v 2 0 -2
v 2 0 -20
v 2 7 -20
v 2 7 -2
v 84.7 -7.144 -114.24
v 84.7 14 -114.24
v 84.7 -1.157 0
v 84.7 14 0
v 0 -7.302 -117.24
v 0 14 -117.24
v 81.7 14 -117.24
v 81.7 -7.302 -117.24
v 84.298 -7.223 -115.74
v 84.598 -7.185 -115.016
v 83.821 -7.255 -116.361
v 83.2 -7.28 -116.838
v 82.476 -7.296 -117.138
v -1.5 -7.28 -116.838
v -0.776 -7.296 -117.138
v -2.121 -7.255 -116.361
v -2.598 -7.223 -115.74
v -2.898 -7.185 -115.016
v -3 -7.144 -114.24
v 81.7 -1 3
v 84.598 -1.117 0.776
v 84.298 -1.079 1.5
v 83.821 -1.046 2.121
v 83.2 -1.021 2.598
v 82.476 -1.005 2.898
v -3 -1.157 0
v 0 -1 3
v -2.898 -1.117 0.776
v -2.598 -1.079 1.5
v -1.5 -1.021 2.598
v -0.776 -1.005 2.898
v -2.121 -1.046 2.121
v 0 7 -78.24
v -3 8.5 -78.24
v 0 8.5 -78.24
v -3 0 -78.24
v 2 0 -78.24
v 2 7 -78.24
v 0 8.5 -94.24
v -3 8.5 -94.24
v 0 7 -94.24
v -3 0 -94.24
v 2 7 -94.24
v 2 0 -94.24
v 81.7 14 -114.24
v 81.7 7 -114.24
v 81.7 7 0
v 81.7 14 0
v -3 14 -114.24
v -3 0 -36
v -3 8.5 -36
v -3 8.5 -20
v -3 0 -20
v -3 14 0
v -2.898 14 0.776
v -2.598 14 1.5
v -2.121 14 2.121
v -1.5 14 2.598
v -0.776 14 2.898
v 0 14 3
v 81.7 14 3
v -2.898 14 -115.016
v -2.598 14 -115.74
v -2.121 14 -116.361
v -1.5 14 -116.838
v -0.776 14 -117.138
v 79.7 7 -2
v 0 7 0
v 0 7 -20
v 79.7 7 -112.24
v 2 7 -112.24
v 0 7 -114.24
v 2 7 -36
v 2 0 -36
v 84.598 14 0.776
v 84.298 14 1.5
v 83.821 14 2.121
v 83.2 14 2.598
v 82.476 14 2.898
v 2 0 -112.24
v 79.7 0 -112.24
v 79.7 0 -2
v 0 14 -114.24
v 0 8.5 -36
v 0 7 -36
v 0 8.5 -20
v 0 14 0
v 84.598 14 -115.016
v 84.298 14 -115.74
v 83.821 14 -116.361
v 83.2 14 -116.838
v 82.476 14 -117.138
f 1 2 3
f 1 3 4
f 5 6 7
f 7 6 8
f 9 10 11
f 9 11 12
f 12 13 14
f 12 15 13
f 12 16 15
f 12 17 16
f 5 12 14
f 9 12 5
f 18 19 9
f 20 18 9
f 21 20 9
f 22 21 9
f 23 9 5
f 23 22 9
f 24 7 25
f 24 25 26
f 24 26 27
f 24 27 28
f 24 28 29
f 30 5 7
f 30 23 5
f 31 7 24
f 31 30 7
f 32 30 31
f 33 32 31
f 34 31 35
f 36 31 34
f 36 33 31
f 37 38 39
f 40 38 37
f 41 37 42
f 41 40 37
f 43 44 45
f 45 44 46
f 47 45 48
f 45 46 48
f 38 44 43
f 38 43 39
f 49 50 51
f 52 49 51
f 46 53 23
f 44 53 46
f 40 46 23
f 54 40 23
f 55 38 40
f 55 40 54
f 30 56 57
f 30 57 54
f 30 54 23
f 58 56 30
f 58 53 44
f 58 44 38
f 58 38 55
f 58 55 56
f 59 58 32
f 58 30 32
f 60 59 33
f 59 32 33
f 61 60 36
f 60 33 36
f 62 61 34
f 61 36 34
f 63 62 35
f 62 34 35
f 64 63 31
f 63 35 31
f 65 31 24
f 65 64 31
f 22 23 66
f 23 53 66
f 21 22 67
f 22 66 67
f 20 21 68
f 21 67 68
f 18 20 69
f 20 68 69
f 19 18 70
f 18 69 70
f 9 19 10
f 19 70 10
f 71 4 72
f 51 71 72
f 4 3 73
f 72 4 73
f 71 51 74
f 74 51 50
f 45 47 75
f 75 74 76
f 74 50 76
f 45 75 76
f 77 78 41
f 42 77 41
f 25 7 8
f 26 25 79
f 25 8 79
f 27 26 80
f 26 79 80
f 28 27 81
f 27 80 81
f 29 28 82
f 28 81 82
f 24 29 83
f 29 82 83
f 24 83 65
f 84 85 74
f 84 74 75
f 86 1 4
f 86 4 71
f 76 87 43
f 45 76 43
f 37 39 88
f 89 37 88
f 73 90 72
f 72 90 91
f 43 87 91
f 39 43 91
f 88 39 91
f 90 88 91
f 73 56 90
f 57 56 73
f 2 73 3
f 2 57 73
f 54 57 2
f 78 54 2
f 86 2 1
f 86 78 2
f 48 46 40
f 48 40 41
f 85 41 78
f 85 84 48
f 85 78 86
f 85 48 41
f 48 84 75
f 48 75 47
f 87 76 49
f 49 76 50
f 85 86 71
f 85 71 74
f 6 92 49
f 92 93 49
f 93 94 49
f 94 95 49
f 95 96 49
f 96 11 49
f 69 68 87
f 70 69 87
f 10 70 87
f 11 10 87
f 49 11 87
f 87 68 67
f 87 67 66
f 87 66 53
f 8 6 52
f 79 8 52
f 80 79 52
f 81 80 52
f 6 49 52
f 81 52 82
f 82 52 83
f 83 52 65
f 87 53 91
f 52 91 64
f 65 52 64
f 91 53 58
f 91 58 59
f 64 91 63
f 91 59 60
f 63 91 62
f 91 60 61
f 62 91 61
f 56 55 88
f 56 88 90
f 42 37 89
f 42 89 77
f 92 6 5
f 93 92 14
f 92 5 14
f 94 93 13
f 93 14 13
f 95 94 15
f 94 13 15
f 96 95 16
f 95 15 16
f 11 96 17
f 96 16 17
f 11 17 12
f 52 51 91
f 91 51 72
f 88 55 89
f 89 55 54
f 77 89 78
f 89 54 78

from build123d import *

# Parameters (mm, degrees)
BOSS_EXTRUDE1_DEPTH   = 14
SKETCH1_W             = 3
SKETCH1_H             = 42.24
BOSS_EXTRUDE1_2_DEPTH = 14
SKETCH1_3_W           = 3
SKETCH1_3_H           = 16
SKETCH1_3_H_2         = 42.24
SKETCH1_3_W_2         = 81.7
SKETCH1_3_H_3         = 114.24
BOSS_EXTRUDE2_DEPTH   = 1
BOSS_EXTRUDE3_DEPTH   = 87.7
FILLET1_R             = 3
SKETCH3_W             = 2
SKETCH3_H             = 42.24
BOSS_EXTRUDE4_DEPTH   = 7
SKETCH4_W             = 16
SKETCH4_H             = 5.5
BOSS_EXTRUDE5_DEPTH   = 3


with BuildPart() as part:
    # Sketch1 → Boss-Extrude1 (new body)
    with BuildSketch(Plane(origin=(0, 0, 0), x_dir=(1, 0, 0), z_dir=(0, 1, 0))):
        Polygon((81.7, 0), (0, 0), (0, 20), (-3, 20), (-3, -3), (84.7, -3), (84.7, 117.24), (-3, 117.24), (-3, 94.24), (0, 94.24), (0, 114.24), (81.7, 114.24), align=None)
    extrude(amount=BOSS_EXTRUDE1_DEPTH)

    # Sketch1<3> → Boss-Extrude2 (add)
    with BuildSketch(Plane(origin=(0, 0, 0), x_dir=(1, 0, 0), z_dir=(0, 1, 0))):
        with Locations((-1.5, 86.24)):
            Rectangle(SKETCH1_3_W, SKETCH1_3_H)
        with Locations((-1.5, 57.12)):
            Rectangle(SKETCH1_3_W, SKETCH1_3_H_2)
        with Locations((-1.5, 28)):
            Rectangle(SKETCH1_3_W, SKETCH1_3_H)
        with Locations((40.85, 57.12)):
            Rectangle(SKETCH1_3_W_2, SKETCH1_3_H_3)
        Polygon((81.7, 0), (0, 0), (0, 20), (-3, 20), (-3, -3), (84.7, -3), (84.7, 117.24), (-3, 117.24), (-3, 94.24), (0, 94.24), (0, 114.24), (81.7, 114.24), align=None)
    extrude(amount=-BOSS_EXTRUDE2_DEPTH)



with BuildPart() as body_2:
    # Sketch1 → Boss-Extrude1 2 (new body)
    with BuildSketch(Plane(origin=(0, 0, 0), x_dir=(1, 0, 0), z_dir=(0, 1, 0))):
        with Locations((-1.5, 57.12)):
            Rectangle(SKETCH1_W, SKETCH1_H)
    extrude(amount=BOSS_EXTRUDE1_2_DEPTH)


with BuildPart() as part_1:
    add(part.part)

    add(body_2.part)  # Boss-Extrude3 merges body 2
    # Sketch2 → Boss-Extrude3 (add)
    with BuildSketch(Plane.ZY.offset(3)):
        Polygon((-117.24, -1), (-117.24, -7.301511381), (3, -1), (3, 0), (-117.24, 0), align=None)
    extrude(amount=-BOSS_EXTRUDE3_DEPTH)

    # Fillet1
    fillet1_edges = [part_1.edges().sort_by_distance(p)[0] for p in [
        (-3, 3.34924431, -117.24),
        (84.7, 3.34924431, -117.24),
        (84.7, 6.5, 3),
        (-3, 6.5, 3),
    ]]
    fillet(fillet1_edges, radius=FILLET1_R)

    # Sketch3 → Boss-Extrude4 (add)
    with BuildSketch(Plane(origin=(0, 0, 0), x_dir=(1, 0, 0), z_dir=(0, 1, 0))):
        with Locations((1, 57.12)):
            Rectangle(SKETCH3_W, SKETCH3_H)
        Polygon((2, 20), (2, 2), (79.7, 2), (79.7, 112.24), (2, 112.24), (2, 94.24), (0, 94.24), (0, 114.24), (81.7, 114.24), (81.7, 0), (0, 0), (0, 20), align=None)
    extrude(amount=BOSS_EXTRUDE4_DEPTH)

    # Sketch4 → Boss-Extrude5 (add)
    with BuildSketch(Plane.ZY.offset(3)):
        with Locations((-86.24, 11.25)):
            Rectangle(SKETCH4_W, SKETCH4_H)
        with Locations((-28, 11.25)):
            Rectangle(SKETCH4_W, SKETCH4_H)
    extrude(amount=-BOSS_EXTRUDE5_DEPTH)


solid = part_1.part
